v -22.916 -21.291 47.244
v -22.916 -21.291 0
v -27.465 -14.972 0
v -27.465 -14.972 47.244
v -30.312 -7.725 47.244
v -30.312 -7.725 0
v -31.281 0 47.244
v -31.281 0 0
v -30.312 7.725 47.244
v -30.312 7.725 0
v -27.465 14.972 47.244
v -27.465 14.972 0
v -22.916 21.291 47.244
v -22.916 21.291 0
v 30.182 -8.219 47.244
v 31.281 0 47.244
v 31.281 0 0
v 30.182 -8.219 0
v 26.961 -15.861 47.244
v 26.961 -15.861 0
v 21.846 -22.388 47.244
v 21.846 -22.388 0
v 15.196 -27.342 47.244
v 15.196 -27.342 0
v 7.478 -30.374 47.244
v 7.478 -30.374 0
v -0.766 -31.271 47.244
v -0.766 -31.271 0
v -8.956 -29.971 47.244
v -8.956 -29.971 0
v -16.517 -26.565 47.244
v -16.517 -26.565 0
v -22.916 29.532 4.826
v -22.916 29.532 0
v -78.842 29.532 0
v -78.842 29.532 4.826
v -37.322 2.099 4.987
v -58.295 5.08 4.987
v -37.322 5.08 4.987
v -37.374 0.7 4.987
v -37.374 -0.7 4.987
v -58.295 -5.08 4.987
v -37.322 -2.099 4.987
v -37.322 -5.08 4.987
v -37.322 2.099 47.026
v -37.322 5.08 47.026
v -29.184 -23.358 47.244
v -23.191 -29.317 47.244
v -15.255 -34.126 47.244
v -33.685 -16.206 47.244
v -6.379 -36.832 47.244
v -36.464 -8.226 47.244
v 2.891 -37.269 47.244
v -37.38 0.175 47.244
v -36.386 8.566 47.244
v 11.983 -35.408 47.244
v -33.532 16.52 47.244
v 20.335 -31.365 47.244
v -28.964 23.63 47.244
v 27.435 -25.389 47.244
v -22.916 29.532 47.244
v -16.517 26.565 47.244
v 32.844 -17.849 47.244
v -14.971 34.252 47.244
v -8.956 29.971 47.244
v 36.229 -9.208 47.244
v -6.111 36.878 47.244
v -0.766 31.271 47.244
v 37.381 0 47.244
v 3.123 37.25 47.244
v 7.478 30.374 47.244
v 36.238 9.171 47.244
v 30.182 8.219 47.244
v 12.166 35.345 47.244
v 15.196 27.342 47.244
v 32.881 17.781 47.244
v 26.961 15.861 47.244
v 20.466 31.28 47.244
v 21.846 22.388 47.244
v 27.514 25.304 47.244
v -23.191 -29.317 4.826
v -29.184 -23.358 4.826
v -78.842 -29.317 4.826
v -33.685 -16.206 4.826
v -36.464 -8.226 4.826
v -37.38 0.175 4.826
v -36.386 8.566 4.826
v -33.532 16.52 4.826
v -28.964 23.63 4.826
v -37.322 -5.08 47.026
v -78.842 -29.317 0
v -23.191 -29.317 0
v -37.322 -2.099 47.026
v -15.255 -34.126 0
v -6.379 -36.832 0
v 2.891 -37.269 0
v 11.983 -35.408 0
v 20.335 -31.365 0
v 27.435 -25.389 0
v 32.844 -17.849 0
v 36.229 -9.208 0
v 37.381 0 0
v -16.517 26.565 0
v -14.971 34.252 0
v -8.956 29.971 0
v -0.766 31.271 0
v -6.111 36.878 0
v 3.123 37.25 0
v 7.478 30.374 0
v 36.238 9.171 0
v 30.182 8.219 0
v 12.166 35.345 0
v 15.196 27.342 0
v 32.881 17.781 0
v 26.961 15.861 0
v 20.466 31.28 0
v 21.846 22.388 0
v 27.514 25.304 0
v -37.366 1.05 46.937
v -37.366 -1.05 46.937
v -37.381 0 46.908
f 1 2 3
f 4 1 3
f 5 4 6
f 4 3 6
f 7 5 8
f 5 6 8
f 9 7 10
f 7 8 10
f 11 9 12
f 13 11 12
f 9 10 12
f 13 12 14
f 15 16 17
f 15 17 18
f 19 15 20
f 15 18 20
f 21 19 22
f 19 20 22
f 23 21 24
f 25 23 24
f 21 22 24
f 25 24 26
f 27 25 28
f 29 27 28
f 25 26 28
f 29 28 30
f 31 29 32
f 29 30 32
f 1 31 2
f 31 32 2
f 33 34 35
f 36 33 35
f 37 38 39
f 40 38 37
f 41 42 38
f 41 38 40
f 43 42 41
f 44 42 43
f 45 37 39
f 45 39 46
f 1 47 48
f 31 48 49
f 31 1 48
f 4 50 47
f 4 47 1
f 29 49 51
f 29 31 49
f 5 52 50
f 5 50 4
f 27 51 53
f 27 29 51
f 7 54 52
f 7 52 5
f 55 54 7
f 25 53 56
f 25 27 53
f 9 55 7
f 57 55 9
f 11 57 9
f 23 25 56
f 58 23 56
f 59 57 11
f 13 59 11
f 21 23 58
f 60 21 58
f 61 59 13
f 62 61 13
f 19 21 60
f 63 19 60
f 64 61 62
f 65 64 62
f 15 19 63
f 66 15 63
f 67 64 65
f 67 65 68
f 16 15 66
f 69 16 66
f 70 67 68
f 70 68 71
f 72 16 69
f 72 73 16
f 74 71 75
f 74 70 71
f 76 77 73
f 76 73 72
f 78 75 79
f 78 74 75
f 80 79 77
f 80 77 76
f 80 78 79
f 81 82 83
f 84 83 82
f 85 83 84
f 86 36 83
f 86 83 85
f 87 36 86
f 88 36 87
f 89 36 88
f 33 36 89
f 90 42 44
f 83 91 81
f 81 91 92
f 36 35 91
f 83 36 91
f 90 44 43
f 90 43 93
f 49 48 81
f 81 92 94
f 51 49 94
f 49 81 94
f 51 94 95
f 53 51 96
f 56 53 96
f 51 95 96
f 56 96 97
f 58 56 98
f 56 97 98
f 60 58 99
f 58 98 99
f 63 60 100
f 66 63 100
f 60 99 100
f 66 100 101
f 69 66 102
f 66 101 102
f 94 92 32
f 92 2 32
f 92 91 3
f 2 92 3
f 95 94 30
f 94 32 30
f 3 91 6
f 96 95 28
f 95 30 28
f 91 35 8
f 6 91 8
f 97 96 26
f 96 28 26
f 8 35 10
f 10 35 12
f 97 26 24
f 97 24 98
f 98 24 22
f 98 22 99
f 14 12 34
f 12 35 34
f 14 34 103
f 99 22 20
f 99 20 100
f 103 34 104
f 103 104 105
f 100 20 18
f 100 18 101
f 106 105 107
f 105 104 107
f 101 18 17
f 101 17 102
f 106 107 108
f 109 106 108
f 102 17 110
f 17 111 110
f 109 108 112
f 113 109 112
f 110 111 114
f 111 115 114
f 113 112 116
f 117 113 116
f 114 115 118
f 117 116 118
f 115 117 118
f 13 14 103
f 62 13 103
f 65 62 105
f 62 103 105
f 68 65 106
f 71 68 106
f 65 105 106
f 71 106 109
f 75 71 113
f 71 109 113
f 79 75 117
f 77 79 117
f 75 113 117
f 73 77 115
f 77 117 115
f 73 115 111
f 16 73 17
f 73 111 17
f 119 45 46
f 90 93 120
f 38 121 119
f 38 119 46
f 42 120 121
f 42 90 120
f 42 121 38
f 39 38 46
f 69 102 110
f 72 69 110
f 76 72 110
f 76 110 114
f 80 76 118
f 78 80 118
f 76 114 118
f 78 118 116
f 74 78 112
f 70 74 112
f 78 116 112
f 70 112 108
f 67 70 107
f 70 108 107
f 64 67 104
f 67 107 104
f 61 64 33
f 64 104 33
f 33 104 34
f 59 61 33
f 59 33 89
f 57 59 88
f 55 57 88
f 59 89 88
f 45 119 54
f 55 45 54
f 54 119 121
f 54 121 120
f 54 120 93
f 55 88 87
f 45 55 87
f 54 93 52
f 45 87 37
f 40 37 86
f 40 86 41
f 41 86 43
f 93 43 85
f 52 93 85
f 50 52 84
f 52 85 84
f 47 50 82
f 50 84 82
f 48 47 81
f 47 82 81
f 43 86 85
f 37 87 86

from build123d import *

# Parameters (mm, degrees)
F1_DEPTH = 47.244
F2_DEPTH = 4.826
F4_DEPTH = 5.08


with BuildPart() as f1:
    # F0 (on Top) → F1 (new body)
    with BuildSketch(Plane.XY):
        with BuildLine():
            Line((-22.916476, 21.291338), (-22.916476, 29.532059))
            ThreePointArc((-22.916476, 29.532059), (-37.380167, 0.174641), (-23.191419, -29.316641))
            Line((-23.191419, -29.316641), (-22.916476, -29.316641))
            Line((-22.916476, -29.316641), (-22.916476, -21.291338))
            ThreePointArc((-22.916476, -21.291338), (-31.28076, 0), (-22.916476, 21.291338))
        make_face()
        with BuildLine():
            ThreePointArc((-23.191419, -29.316641), (16.284944, -33.646812), (37.380575, 0))
            ThreePointArc((37.380575, 0), (16.441963, 33.570362), (-22.916476, 29.532059))
            Line((-22.916476, 29.532059), (-22.916476, 21.291338))
            ThreePointArc((-22.916476, 21.291338), (11.437683, 29.114693), (31.28076, 0))
            ThreePointArc((31.28076, 0), (11.437683, -29.114693), (-22.916476, -21.291338))
            Line((-22.916476, -21.291338), (-22.916476, -29.316641))
            Line((-22.916476, -29.316641), (-23.191419, -29.316641))
        make_face()
    extrude(amount=F1_DEPTH)

    # F0 (on Top) → F2 (join)
    with BuildSketch(Plane.XY):
        with BuildLine():
            ThreePointArc((-23.191419, -29.316641), (-37.380167, 0.174641), (-22.916476, 29.532059))
            Line((-22.916476, 29.532059), (-78.842215, 29.532059))
            Line((-78.842215, 29.532059), (-78.842215, -29.316641))
            Line((-78.842215, -29.316641), (-23.191419, -29.316641))
        make_face()
    extrude(amount=F2_DEPTH)

    # F3 (on Front) → F4 (join, symmetric)
    with BuildSketch(Plane.XZ):
        Polygon((-37.321575, 4.987057), (-37.321575, 47.026183), (-58.294769, 4.987057), align=None)
    extrude(amount=F4_DEPTH, both=True)


solid = f1.part
